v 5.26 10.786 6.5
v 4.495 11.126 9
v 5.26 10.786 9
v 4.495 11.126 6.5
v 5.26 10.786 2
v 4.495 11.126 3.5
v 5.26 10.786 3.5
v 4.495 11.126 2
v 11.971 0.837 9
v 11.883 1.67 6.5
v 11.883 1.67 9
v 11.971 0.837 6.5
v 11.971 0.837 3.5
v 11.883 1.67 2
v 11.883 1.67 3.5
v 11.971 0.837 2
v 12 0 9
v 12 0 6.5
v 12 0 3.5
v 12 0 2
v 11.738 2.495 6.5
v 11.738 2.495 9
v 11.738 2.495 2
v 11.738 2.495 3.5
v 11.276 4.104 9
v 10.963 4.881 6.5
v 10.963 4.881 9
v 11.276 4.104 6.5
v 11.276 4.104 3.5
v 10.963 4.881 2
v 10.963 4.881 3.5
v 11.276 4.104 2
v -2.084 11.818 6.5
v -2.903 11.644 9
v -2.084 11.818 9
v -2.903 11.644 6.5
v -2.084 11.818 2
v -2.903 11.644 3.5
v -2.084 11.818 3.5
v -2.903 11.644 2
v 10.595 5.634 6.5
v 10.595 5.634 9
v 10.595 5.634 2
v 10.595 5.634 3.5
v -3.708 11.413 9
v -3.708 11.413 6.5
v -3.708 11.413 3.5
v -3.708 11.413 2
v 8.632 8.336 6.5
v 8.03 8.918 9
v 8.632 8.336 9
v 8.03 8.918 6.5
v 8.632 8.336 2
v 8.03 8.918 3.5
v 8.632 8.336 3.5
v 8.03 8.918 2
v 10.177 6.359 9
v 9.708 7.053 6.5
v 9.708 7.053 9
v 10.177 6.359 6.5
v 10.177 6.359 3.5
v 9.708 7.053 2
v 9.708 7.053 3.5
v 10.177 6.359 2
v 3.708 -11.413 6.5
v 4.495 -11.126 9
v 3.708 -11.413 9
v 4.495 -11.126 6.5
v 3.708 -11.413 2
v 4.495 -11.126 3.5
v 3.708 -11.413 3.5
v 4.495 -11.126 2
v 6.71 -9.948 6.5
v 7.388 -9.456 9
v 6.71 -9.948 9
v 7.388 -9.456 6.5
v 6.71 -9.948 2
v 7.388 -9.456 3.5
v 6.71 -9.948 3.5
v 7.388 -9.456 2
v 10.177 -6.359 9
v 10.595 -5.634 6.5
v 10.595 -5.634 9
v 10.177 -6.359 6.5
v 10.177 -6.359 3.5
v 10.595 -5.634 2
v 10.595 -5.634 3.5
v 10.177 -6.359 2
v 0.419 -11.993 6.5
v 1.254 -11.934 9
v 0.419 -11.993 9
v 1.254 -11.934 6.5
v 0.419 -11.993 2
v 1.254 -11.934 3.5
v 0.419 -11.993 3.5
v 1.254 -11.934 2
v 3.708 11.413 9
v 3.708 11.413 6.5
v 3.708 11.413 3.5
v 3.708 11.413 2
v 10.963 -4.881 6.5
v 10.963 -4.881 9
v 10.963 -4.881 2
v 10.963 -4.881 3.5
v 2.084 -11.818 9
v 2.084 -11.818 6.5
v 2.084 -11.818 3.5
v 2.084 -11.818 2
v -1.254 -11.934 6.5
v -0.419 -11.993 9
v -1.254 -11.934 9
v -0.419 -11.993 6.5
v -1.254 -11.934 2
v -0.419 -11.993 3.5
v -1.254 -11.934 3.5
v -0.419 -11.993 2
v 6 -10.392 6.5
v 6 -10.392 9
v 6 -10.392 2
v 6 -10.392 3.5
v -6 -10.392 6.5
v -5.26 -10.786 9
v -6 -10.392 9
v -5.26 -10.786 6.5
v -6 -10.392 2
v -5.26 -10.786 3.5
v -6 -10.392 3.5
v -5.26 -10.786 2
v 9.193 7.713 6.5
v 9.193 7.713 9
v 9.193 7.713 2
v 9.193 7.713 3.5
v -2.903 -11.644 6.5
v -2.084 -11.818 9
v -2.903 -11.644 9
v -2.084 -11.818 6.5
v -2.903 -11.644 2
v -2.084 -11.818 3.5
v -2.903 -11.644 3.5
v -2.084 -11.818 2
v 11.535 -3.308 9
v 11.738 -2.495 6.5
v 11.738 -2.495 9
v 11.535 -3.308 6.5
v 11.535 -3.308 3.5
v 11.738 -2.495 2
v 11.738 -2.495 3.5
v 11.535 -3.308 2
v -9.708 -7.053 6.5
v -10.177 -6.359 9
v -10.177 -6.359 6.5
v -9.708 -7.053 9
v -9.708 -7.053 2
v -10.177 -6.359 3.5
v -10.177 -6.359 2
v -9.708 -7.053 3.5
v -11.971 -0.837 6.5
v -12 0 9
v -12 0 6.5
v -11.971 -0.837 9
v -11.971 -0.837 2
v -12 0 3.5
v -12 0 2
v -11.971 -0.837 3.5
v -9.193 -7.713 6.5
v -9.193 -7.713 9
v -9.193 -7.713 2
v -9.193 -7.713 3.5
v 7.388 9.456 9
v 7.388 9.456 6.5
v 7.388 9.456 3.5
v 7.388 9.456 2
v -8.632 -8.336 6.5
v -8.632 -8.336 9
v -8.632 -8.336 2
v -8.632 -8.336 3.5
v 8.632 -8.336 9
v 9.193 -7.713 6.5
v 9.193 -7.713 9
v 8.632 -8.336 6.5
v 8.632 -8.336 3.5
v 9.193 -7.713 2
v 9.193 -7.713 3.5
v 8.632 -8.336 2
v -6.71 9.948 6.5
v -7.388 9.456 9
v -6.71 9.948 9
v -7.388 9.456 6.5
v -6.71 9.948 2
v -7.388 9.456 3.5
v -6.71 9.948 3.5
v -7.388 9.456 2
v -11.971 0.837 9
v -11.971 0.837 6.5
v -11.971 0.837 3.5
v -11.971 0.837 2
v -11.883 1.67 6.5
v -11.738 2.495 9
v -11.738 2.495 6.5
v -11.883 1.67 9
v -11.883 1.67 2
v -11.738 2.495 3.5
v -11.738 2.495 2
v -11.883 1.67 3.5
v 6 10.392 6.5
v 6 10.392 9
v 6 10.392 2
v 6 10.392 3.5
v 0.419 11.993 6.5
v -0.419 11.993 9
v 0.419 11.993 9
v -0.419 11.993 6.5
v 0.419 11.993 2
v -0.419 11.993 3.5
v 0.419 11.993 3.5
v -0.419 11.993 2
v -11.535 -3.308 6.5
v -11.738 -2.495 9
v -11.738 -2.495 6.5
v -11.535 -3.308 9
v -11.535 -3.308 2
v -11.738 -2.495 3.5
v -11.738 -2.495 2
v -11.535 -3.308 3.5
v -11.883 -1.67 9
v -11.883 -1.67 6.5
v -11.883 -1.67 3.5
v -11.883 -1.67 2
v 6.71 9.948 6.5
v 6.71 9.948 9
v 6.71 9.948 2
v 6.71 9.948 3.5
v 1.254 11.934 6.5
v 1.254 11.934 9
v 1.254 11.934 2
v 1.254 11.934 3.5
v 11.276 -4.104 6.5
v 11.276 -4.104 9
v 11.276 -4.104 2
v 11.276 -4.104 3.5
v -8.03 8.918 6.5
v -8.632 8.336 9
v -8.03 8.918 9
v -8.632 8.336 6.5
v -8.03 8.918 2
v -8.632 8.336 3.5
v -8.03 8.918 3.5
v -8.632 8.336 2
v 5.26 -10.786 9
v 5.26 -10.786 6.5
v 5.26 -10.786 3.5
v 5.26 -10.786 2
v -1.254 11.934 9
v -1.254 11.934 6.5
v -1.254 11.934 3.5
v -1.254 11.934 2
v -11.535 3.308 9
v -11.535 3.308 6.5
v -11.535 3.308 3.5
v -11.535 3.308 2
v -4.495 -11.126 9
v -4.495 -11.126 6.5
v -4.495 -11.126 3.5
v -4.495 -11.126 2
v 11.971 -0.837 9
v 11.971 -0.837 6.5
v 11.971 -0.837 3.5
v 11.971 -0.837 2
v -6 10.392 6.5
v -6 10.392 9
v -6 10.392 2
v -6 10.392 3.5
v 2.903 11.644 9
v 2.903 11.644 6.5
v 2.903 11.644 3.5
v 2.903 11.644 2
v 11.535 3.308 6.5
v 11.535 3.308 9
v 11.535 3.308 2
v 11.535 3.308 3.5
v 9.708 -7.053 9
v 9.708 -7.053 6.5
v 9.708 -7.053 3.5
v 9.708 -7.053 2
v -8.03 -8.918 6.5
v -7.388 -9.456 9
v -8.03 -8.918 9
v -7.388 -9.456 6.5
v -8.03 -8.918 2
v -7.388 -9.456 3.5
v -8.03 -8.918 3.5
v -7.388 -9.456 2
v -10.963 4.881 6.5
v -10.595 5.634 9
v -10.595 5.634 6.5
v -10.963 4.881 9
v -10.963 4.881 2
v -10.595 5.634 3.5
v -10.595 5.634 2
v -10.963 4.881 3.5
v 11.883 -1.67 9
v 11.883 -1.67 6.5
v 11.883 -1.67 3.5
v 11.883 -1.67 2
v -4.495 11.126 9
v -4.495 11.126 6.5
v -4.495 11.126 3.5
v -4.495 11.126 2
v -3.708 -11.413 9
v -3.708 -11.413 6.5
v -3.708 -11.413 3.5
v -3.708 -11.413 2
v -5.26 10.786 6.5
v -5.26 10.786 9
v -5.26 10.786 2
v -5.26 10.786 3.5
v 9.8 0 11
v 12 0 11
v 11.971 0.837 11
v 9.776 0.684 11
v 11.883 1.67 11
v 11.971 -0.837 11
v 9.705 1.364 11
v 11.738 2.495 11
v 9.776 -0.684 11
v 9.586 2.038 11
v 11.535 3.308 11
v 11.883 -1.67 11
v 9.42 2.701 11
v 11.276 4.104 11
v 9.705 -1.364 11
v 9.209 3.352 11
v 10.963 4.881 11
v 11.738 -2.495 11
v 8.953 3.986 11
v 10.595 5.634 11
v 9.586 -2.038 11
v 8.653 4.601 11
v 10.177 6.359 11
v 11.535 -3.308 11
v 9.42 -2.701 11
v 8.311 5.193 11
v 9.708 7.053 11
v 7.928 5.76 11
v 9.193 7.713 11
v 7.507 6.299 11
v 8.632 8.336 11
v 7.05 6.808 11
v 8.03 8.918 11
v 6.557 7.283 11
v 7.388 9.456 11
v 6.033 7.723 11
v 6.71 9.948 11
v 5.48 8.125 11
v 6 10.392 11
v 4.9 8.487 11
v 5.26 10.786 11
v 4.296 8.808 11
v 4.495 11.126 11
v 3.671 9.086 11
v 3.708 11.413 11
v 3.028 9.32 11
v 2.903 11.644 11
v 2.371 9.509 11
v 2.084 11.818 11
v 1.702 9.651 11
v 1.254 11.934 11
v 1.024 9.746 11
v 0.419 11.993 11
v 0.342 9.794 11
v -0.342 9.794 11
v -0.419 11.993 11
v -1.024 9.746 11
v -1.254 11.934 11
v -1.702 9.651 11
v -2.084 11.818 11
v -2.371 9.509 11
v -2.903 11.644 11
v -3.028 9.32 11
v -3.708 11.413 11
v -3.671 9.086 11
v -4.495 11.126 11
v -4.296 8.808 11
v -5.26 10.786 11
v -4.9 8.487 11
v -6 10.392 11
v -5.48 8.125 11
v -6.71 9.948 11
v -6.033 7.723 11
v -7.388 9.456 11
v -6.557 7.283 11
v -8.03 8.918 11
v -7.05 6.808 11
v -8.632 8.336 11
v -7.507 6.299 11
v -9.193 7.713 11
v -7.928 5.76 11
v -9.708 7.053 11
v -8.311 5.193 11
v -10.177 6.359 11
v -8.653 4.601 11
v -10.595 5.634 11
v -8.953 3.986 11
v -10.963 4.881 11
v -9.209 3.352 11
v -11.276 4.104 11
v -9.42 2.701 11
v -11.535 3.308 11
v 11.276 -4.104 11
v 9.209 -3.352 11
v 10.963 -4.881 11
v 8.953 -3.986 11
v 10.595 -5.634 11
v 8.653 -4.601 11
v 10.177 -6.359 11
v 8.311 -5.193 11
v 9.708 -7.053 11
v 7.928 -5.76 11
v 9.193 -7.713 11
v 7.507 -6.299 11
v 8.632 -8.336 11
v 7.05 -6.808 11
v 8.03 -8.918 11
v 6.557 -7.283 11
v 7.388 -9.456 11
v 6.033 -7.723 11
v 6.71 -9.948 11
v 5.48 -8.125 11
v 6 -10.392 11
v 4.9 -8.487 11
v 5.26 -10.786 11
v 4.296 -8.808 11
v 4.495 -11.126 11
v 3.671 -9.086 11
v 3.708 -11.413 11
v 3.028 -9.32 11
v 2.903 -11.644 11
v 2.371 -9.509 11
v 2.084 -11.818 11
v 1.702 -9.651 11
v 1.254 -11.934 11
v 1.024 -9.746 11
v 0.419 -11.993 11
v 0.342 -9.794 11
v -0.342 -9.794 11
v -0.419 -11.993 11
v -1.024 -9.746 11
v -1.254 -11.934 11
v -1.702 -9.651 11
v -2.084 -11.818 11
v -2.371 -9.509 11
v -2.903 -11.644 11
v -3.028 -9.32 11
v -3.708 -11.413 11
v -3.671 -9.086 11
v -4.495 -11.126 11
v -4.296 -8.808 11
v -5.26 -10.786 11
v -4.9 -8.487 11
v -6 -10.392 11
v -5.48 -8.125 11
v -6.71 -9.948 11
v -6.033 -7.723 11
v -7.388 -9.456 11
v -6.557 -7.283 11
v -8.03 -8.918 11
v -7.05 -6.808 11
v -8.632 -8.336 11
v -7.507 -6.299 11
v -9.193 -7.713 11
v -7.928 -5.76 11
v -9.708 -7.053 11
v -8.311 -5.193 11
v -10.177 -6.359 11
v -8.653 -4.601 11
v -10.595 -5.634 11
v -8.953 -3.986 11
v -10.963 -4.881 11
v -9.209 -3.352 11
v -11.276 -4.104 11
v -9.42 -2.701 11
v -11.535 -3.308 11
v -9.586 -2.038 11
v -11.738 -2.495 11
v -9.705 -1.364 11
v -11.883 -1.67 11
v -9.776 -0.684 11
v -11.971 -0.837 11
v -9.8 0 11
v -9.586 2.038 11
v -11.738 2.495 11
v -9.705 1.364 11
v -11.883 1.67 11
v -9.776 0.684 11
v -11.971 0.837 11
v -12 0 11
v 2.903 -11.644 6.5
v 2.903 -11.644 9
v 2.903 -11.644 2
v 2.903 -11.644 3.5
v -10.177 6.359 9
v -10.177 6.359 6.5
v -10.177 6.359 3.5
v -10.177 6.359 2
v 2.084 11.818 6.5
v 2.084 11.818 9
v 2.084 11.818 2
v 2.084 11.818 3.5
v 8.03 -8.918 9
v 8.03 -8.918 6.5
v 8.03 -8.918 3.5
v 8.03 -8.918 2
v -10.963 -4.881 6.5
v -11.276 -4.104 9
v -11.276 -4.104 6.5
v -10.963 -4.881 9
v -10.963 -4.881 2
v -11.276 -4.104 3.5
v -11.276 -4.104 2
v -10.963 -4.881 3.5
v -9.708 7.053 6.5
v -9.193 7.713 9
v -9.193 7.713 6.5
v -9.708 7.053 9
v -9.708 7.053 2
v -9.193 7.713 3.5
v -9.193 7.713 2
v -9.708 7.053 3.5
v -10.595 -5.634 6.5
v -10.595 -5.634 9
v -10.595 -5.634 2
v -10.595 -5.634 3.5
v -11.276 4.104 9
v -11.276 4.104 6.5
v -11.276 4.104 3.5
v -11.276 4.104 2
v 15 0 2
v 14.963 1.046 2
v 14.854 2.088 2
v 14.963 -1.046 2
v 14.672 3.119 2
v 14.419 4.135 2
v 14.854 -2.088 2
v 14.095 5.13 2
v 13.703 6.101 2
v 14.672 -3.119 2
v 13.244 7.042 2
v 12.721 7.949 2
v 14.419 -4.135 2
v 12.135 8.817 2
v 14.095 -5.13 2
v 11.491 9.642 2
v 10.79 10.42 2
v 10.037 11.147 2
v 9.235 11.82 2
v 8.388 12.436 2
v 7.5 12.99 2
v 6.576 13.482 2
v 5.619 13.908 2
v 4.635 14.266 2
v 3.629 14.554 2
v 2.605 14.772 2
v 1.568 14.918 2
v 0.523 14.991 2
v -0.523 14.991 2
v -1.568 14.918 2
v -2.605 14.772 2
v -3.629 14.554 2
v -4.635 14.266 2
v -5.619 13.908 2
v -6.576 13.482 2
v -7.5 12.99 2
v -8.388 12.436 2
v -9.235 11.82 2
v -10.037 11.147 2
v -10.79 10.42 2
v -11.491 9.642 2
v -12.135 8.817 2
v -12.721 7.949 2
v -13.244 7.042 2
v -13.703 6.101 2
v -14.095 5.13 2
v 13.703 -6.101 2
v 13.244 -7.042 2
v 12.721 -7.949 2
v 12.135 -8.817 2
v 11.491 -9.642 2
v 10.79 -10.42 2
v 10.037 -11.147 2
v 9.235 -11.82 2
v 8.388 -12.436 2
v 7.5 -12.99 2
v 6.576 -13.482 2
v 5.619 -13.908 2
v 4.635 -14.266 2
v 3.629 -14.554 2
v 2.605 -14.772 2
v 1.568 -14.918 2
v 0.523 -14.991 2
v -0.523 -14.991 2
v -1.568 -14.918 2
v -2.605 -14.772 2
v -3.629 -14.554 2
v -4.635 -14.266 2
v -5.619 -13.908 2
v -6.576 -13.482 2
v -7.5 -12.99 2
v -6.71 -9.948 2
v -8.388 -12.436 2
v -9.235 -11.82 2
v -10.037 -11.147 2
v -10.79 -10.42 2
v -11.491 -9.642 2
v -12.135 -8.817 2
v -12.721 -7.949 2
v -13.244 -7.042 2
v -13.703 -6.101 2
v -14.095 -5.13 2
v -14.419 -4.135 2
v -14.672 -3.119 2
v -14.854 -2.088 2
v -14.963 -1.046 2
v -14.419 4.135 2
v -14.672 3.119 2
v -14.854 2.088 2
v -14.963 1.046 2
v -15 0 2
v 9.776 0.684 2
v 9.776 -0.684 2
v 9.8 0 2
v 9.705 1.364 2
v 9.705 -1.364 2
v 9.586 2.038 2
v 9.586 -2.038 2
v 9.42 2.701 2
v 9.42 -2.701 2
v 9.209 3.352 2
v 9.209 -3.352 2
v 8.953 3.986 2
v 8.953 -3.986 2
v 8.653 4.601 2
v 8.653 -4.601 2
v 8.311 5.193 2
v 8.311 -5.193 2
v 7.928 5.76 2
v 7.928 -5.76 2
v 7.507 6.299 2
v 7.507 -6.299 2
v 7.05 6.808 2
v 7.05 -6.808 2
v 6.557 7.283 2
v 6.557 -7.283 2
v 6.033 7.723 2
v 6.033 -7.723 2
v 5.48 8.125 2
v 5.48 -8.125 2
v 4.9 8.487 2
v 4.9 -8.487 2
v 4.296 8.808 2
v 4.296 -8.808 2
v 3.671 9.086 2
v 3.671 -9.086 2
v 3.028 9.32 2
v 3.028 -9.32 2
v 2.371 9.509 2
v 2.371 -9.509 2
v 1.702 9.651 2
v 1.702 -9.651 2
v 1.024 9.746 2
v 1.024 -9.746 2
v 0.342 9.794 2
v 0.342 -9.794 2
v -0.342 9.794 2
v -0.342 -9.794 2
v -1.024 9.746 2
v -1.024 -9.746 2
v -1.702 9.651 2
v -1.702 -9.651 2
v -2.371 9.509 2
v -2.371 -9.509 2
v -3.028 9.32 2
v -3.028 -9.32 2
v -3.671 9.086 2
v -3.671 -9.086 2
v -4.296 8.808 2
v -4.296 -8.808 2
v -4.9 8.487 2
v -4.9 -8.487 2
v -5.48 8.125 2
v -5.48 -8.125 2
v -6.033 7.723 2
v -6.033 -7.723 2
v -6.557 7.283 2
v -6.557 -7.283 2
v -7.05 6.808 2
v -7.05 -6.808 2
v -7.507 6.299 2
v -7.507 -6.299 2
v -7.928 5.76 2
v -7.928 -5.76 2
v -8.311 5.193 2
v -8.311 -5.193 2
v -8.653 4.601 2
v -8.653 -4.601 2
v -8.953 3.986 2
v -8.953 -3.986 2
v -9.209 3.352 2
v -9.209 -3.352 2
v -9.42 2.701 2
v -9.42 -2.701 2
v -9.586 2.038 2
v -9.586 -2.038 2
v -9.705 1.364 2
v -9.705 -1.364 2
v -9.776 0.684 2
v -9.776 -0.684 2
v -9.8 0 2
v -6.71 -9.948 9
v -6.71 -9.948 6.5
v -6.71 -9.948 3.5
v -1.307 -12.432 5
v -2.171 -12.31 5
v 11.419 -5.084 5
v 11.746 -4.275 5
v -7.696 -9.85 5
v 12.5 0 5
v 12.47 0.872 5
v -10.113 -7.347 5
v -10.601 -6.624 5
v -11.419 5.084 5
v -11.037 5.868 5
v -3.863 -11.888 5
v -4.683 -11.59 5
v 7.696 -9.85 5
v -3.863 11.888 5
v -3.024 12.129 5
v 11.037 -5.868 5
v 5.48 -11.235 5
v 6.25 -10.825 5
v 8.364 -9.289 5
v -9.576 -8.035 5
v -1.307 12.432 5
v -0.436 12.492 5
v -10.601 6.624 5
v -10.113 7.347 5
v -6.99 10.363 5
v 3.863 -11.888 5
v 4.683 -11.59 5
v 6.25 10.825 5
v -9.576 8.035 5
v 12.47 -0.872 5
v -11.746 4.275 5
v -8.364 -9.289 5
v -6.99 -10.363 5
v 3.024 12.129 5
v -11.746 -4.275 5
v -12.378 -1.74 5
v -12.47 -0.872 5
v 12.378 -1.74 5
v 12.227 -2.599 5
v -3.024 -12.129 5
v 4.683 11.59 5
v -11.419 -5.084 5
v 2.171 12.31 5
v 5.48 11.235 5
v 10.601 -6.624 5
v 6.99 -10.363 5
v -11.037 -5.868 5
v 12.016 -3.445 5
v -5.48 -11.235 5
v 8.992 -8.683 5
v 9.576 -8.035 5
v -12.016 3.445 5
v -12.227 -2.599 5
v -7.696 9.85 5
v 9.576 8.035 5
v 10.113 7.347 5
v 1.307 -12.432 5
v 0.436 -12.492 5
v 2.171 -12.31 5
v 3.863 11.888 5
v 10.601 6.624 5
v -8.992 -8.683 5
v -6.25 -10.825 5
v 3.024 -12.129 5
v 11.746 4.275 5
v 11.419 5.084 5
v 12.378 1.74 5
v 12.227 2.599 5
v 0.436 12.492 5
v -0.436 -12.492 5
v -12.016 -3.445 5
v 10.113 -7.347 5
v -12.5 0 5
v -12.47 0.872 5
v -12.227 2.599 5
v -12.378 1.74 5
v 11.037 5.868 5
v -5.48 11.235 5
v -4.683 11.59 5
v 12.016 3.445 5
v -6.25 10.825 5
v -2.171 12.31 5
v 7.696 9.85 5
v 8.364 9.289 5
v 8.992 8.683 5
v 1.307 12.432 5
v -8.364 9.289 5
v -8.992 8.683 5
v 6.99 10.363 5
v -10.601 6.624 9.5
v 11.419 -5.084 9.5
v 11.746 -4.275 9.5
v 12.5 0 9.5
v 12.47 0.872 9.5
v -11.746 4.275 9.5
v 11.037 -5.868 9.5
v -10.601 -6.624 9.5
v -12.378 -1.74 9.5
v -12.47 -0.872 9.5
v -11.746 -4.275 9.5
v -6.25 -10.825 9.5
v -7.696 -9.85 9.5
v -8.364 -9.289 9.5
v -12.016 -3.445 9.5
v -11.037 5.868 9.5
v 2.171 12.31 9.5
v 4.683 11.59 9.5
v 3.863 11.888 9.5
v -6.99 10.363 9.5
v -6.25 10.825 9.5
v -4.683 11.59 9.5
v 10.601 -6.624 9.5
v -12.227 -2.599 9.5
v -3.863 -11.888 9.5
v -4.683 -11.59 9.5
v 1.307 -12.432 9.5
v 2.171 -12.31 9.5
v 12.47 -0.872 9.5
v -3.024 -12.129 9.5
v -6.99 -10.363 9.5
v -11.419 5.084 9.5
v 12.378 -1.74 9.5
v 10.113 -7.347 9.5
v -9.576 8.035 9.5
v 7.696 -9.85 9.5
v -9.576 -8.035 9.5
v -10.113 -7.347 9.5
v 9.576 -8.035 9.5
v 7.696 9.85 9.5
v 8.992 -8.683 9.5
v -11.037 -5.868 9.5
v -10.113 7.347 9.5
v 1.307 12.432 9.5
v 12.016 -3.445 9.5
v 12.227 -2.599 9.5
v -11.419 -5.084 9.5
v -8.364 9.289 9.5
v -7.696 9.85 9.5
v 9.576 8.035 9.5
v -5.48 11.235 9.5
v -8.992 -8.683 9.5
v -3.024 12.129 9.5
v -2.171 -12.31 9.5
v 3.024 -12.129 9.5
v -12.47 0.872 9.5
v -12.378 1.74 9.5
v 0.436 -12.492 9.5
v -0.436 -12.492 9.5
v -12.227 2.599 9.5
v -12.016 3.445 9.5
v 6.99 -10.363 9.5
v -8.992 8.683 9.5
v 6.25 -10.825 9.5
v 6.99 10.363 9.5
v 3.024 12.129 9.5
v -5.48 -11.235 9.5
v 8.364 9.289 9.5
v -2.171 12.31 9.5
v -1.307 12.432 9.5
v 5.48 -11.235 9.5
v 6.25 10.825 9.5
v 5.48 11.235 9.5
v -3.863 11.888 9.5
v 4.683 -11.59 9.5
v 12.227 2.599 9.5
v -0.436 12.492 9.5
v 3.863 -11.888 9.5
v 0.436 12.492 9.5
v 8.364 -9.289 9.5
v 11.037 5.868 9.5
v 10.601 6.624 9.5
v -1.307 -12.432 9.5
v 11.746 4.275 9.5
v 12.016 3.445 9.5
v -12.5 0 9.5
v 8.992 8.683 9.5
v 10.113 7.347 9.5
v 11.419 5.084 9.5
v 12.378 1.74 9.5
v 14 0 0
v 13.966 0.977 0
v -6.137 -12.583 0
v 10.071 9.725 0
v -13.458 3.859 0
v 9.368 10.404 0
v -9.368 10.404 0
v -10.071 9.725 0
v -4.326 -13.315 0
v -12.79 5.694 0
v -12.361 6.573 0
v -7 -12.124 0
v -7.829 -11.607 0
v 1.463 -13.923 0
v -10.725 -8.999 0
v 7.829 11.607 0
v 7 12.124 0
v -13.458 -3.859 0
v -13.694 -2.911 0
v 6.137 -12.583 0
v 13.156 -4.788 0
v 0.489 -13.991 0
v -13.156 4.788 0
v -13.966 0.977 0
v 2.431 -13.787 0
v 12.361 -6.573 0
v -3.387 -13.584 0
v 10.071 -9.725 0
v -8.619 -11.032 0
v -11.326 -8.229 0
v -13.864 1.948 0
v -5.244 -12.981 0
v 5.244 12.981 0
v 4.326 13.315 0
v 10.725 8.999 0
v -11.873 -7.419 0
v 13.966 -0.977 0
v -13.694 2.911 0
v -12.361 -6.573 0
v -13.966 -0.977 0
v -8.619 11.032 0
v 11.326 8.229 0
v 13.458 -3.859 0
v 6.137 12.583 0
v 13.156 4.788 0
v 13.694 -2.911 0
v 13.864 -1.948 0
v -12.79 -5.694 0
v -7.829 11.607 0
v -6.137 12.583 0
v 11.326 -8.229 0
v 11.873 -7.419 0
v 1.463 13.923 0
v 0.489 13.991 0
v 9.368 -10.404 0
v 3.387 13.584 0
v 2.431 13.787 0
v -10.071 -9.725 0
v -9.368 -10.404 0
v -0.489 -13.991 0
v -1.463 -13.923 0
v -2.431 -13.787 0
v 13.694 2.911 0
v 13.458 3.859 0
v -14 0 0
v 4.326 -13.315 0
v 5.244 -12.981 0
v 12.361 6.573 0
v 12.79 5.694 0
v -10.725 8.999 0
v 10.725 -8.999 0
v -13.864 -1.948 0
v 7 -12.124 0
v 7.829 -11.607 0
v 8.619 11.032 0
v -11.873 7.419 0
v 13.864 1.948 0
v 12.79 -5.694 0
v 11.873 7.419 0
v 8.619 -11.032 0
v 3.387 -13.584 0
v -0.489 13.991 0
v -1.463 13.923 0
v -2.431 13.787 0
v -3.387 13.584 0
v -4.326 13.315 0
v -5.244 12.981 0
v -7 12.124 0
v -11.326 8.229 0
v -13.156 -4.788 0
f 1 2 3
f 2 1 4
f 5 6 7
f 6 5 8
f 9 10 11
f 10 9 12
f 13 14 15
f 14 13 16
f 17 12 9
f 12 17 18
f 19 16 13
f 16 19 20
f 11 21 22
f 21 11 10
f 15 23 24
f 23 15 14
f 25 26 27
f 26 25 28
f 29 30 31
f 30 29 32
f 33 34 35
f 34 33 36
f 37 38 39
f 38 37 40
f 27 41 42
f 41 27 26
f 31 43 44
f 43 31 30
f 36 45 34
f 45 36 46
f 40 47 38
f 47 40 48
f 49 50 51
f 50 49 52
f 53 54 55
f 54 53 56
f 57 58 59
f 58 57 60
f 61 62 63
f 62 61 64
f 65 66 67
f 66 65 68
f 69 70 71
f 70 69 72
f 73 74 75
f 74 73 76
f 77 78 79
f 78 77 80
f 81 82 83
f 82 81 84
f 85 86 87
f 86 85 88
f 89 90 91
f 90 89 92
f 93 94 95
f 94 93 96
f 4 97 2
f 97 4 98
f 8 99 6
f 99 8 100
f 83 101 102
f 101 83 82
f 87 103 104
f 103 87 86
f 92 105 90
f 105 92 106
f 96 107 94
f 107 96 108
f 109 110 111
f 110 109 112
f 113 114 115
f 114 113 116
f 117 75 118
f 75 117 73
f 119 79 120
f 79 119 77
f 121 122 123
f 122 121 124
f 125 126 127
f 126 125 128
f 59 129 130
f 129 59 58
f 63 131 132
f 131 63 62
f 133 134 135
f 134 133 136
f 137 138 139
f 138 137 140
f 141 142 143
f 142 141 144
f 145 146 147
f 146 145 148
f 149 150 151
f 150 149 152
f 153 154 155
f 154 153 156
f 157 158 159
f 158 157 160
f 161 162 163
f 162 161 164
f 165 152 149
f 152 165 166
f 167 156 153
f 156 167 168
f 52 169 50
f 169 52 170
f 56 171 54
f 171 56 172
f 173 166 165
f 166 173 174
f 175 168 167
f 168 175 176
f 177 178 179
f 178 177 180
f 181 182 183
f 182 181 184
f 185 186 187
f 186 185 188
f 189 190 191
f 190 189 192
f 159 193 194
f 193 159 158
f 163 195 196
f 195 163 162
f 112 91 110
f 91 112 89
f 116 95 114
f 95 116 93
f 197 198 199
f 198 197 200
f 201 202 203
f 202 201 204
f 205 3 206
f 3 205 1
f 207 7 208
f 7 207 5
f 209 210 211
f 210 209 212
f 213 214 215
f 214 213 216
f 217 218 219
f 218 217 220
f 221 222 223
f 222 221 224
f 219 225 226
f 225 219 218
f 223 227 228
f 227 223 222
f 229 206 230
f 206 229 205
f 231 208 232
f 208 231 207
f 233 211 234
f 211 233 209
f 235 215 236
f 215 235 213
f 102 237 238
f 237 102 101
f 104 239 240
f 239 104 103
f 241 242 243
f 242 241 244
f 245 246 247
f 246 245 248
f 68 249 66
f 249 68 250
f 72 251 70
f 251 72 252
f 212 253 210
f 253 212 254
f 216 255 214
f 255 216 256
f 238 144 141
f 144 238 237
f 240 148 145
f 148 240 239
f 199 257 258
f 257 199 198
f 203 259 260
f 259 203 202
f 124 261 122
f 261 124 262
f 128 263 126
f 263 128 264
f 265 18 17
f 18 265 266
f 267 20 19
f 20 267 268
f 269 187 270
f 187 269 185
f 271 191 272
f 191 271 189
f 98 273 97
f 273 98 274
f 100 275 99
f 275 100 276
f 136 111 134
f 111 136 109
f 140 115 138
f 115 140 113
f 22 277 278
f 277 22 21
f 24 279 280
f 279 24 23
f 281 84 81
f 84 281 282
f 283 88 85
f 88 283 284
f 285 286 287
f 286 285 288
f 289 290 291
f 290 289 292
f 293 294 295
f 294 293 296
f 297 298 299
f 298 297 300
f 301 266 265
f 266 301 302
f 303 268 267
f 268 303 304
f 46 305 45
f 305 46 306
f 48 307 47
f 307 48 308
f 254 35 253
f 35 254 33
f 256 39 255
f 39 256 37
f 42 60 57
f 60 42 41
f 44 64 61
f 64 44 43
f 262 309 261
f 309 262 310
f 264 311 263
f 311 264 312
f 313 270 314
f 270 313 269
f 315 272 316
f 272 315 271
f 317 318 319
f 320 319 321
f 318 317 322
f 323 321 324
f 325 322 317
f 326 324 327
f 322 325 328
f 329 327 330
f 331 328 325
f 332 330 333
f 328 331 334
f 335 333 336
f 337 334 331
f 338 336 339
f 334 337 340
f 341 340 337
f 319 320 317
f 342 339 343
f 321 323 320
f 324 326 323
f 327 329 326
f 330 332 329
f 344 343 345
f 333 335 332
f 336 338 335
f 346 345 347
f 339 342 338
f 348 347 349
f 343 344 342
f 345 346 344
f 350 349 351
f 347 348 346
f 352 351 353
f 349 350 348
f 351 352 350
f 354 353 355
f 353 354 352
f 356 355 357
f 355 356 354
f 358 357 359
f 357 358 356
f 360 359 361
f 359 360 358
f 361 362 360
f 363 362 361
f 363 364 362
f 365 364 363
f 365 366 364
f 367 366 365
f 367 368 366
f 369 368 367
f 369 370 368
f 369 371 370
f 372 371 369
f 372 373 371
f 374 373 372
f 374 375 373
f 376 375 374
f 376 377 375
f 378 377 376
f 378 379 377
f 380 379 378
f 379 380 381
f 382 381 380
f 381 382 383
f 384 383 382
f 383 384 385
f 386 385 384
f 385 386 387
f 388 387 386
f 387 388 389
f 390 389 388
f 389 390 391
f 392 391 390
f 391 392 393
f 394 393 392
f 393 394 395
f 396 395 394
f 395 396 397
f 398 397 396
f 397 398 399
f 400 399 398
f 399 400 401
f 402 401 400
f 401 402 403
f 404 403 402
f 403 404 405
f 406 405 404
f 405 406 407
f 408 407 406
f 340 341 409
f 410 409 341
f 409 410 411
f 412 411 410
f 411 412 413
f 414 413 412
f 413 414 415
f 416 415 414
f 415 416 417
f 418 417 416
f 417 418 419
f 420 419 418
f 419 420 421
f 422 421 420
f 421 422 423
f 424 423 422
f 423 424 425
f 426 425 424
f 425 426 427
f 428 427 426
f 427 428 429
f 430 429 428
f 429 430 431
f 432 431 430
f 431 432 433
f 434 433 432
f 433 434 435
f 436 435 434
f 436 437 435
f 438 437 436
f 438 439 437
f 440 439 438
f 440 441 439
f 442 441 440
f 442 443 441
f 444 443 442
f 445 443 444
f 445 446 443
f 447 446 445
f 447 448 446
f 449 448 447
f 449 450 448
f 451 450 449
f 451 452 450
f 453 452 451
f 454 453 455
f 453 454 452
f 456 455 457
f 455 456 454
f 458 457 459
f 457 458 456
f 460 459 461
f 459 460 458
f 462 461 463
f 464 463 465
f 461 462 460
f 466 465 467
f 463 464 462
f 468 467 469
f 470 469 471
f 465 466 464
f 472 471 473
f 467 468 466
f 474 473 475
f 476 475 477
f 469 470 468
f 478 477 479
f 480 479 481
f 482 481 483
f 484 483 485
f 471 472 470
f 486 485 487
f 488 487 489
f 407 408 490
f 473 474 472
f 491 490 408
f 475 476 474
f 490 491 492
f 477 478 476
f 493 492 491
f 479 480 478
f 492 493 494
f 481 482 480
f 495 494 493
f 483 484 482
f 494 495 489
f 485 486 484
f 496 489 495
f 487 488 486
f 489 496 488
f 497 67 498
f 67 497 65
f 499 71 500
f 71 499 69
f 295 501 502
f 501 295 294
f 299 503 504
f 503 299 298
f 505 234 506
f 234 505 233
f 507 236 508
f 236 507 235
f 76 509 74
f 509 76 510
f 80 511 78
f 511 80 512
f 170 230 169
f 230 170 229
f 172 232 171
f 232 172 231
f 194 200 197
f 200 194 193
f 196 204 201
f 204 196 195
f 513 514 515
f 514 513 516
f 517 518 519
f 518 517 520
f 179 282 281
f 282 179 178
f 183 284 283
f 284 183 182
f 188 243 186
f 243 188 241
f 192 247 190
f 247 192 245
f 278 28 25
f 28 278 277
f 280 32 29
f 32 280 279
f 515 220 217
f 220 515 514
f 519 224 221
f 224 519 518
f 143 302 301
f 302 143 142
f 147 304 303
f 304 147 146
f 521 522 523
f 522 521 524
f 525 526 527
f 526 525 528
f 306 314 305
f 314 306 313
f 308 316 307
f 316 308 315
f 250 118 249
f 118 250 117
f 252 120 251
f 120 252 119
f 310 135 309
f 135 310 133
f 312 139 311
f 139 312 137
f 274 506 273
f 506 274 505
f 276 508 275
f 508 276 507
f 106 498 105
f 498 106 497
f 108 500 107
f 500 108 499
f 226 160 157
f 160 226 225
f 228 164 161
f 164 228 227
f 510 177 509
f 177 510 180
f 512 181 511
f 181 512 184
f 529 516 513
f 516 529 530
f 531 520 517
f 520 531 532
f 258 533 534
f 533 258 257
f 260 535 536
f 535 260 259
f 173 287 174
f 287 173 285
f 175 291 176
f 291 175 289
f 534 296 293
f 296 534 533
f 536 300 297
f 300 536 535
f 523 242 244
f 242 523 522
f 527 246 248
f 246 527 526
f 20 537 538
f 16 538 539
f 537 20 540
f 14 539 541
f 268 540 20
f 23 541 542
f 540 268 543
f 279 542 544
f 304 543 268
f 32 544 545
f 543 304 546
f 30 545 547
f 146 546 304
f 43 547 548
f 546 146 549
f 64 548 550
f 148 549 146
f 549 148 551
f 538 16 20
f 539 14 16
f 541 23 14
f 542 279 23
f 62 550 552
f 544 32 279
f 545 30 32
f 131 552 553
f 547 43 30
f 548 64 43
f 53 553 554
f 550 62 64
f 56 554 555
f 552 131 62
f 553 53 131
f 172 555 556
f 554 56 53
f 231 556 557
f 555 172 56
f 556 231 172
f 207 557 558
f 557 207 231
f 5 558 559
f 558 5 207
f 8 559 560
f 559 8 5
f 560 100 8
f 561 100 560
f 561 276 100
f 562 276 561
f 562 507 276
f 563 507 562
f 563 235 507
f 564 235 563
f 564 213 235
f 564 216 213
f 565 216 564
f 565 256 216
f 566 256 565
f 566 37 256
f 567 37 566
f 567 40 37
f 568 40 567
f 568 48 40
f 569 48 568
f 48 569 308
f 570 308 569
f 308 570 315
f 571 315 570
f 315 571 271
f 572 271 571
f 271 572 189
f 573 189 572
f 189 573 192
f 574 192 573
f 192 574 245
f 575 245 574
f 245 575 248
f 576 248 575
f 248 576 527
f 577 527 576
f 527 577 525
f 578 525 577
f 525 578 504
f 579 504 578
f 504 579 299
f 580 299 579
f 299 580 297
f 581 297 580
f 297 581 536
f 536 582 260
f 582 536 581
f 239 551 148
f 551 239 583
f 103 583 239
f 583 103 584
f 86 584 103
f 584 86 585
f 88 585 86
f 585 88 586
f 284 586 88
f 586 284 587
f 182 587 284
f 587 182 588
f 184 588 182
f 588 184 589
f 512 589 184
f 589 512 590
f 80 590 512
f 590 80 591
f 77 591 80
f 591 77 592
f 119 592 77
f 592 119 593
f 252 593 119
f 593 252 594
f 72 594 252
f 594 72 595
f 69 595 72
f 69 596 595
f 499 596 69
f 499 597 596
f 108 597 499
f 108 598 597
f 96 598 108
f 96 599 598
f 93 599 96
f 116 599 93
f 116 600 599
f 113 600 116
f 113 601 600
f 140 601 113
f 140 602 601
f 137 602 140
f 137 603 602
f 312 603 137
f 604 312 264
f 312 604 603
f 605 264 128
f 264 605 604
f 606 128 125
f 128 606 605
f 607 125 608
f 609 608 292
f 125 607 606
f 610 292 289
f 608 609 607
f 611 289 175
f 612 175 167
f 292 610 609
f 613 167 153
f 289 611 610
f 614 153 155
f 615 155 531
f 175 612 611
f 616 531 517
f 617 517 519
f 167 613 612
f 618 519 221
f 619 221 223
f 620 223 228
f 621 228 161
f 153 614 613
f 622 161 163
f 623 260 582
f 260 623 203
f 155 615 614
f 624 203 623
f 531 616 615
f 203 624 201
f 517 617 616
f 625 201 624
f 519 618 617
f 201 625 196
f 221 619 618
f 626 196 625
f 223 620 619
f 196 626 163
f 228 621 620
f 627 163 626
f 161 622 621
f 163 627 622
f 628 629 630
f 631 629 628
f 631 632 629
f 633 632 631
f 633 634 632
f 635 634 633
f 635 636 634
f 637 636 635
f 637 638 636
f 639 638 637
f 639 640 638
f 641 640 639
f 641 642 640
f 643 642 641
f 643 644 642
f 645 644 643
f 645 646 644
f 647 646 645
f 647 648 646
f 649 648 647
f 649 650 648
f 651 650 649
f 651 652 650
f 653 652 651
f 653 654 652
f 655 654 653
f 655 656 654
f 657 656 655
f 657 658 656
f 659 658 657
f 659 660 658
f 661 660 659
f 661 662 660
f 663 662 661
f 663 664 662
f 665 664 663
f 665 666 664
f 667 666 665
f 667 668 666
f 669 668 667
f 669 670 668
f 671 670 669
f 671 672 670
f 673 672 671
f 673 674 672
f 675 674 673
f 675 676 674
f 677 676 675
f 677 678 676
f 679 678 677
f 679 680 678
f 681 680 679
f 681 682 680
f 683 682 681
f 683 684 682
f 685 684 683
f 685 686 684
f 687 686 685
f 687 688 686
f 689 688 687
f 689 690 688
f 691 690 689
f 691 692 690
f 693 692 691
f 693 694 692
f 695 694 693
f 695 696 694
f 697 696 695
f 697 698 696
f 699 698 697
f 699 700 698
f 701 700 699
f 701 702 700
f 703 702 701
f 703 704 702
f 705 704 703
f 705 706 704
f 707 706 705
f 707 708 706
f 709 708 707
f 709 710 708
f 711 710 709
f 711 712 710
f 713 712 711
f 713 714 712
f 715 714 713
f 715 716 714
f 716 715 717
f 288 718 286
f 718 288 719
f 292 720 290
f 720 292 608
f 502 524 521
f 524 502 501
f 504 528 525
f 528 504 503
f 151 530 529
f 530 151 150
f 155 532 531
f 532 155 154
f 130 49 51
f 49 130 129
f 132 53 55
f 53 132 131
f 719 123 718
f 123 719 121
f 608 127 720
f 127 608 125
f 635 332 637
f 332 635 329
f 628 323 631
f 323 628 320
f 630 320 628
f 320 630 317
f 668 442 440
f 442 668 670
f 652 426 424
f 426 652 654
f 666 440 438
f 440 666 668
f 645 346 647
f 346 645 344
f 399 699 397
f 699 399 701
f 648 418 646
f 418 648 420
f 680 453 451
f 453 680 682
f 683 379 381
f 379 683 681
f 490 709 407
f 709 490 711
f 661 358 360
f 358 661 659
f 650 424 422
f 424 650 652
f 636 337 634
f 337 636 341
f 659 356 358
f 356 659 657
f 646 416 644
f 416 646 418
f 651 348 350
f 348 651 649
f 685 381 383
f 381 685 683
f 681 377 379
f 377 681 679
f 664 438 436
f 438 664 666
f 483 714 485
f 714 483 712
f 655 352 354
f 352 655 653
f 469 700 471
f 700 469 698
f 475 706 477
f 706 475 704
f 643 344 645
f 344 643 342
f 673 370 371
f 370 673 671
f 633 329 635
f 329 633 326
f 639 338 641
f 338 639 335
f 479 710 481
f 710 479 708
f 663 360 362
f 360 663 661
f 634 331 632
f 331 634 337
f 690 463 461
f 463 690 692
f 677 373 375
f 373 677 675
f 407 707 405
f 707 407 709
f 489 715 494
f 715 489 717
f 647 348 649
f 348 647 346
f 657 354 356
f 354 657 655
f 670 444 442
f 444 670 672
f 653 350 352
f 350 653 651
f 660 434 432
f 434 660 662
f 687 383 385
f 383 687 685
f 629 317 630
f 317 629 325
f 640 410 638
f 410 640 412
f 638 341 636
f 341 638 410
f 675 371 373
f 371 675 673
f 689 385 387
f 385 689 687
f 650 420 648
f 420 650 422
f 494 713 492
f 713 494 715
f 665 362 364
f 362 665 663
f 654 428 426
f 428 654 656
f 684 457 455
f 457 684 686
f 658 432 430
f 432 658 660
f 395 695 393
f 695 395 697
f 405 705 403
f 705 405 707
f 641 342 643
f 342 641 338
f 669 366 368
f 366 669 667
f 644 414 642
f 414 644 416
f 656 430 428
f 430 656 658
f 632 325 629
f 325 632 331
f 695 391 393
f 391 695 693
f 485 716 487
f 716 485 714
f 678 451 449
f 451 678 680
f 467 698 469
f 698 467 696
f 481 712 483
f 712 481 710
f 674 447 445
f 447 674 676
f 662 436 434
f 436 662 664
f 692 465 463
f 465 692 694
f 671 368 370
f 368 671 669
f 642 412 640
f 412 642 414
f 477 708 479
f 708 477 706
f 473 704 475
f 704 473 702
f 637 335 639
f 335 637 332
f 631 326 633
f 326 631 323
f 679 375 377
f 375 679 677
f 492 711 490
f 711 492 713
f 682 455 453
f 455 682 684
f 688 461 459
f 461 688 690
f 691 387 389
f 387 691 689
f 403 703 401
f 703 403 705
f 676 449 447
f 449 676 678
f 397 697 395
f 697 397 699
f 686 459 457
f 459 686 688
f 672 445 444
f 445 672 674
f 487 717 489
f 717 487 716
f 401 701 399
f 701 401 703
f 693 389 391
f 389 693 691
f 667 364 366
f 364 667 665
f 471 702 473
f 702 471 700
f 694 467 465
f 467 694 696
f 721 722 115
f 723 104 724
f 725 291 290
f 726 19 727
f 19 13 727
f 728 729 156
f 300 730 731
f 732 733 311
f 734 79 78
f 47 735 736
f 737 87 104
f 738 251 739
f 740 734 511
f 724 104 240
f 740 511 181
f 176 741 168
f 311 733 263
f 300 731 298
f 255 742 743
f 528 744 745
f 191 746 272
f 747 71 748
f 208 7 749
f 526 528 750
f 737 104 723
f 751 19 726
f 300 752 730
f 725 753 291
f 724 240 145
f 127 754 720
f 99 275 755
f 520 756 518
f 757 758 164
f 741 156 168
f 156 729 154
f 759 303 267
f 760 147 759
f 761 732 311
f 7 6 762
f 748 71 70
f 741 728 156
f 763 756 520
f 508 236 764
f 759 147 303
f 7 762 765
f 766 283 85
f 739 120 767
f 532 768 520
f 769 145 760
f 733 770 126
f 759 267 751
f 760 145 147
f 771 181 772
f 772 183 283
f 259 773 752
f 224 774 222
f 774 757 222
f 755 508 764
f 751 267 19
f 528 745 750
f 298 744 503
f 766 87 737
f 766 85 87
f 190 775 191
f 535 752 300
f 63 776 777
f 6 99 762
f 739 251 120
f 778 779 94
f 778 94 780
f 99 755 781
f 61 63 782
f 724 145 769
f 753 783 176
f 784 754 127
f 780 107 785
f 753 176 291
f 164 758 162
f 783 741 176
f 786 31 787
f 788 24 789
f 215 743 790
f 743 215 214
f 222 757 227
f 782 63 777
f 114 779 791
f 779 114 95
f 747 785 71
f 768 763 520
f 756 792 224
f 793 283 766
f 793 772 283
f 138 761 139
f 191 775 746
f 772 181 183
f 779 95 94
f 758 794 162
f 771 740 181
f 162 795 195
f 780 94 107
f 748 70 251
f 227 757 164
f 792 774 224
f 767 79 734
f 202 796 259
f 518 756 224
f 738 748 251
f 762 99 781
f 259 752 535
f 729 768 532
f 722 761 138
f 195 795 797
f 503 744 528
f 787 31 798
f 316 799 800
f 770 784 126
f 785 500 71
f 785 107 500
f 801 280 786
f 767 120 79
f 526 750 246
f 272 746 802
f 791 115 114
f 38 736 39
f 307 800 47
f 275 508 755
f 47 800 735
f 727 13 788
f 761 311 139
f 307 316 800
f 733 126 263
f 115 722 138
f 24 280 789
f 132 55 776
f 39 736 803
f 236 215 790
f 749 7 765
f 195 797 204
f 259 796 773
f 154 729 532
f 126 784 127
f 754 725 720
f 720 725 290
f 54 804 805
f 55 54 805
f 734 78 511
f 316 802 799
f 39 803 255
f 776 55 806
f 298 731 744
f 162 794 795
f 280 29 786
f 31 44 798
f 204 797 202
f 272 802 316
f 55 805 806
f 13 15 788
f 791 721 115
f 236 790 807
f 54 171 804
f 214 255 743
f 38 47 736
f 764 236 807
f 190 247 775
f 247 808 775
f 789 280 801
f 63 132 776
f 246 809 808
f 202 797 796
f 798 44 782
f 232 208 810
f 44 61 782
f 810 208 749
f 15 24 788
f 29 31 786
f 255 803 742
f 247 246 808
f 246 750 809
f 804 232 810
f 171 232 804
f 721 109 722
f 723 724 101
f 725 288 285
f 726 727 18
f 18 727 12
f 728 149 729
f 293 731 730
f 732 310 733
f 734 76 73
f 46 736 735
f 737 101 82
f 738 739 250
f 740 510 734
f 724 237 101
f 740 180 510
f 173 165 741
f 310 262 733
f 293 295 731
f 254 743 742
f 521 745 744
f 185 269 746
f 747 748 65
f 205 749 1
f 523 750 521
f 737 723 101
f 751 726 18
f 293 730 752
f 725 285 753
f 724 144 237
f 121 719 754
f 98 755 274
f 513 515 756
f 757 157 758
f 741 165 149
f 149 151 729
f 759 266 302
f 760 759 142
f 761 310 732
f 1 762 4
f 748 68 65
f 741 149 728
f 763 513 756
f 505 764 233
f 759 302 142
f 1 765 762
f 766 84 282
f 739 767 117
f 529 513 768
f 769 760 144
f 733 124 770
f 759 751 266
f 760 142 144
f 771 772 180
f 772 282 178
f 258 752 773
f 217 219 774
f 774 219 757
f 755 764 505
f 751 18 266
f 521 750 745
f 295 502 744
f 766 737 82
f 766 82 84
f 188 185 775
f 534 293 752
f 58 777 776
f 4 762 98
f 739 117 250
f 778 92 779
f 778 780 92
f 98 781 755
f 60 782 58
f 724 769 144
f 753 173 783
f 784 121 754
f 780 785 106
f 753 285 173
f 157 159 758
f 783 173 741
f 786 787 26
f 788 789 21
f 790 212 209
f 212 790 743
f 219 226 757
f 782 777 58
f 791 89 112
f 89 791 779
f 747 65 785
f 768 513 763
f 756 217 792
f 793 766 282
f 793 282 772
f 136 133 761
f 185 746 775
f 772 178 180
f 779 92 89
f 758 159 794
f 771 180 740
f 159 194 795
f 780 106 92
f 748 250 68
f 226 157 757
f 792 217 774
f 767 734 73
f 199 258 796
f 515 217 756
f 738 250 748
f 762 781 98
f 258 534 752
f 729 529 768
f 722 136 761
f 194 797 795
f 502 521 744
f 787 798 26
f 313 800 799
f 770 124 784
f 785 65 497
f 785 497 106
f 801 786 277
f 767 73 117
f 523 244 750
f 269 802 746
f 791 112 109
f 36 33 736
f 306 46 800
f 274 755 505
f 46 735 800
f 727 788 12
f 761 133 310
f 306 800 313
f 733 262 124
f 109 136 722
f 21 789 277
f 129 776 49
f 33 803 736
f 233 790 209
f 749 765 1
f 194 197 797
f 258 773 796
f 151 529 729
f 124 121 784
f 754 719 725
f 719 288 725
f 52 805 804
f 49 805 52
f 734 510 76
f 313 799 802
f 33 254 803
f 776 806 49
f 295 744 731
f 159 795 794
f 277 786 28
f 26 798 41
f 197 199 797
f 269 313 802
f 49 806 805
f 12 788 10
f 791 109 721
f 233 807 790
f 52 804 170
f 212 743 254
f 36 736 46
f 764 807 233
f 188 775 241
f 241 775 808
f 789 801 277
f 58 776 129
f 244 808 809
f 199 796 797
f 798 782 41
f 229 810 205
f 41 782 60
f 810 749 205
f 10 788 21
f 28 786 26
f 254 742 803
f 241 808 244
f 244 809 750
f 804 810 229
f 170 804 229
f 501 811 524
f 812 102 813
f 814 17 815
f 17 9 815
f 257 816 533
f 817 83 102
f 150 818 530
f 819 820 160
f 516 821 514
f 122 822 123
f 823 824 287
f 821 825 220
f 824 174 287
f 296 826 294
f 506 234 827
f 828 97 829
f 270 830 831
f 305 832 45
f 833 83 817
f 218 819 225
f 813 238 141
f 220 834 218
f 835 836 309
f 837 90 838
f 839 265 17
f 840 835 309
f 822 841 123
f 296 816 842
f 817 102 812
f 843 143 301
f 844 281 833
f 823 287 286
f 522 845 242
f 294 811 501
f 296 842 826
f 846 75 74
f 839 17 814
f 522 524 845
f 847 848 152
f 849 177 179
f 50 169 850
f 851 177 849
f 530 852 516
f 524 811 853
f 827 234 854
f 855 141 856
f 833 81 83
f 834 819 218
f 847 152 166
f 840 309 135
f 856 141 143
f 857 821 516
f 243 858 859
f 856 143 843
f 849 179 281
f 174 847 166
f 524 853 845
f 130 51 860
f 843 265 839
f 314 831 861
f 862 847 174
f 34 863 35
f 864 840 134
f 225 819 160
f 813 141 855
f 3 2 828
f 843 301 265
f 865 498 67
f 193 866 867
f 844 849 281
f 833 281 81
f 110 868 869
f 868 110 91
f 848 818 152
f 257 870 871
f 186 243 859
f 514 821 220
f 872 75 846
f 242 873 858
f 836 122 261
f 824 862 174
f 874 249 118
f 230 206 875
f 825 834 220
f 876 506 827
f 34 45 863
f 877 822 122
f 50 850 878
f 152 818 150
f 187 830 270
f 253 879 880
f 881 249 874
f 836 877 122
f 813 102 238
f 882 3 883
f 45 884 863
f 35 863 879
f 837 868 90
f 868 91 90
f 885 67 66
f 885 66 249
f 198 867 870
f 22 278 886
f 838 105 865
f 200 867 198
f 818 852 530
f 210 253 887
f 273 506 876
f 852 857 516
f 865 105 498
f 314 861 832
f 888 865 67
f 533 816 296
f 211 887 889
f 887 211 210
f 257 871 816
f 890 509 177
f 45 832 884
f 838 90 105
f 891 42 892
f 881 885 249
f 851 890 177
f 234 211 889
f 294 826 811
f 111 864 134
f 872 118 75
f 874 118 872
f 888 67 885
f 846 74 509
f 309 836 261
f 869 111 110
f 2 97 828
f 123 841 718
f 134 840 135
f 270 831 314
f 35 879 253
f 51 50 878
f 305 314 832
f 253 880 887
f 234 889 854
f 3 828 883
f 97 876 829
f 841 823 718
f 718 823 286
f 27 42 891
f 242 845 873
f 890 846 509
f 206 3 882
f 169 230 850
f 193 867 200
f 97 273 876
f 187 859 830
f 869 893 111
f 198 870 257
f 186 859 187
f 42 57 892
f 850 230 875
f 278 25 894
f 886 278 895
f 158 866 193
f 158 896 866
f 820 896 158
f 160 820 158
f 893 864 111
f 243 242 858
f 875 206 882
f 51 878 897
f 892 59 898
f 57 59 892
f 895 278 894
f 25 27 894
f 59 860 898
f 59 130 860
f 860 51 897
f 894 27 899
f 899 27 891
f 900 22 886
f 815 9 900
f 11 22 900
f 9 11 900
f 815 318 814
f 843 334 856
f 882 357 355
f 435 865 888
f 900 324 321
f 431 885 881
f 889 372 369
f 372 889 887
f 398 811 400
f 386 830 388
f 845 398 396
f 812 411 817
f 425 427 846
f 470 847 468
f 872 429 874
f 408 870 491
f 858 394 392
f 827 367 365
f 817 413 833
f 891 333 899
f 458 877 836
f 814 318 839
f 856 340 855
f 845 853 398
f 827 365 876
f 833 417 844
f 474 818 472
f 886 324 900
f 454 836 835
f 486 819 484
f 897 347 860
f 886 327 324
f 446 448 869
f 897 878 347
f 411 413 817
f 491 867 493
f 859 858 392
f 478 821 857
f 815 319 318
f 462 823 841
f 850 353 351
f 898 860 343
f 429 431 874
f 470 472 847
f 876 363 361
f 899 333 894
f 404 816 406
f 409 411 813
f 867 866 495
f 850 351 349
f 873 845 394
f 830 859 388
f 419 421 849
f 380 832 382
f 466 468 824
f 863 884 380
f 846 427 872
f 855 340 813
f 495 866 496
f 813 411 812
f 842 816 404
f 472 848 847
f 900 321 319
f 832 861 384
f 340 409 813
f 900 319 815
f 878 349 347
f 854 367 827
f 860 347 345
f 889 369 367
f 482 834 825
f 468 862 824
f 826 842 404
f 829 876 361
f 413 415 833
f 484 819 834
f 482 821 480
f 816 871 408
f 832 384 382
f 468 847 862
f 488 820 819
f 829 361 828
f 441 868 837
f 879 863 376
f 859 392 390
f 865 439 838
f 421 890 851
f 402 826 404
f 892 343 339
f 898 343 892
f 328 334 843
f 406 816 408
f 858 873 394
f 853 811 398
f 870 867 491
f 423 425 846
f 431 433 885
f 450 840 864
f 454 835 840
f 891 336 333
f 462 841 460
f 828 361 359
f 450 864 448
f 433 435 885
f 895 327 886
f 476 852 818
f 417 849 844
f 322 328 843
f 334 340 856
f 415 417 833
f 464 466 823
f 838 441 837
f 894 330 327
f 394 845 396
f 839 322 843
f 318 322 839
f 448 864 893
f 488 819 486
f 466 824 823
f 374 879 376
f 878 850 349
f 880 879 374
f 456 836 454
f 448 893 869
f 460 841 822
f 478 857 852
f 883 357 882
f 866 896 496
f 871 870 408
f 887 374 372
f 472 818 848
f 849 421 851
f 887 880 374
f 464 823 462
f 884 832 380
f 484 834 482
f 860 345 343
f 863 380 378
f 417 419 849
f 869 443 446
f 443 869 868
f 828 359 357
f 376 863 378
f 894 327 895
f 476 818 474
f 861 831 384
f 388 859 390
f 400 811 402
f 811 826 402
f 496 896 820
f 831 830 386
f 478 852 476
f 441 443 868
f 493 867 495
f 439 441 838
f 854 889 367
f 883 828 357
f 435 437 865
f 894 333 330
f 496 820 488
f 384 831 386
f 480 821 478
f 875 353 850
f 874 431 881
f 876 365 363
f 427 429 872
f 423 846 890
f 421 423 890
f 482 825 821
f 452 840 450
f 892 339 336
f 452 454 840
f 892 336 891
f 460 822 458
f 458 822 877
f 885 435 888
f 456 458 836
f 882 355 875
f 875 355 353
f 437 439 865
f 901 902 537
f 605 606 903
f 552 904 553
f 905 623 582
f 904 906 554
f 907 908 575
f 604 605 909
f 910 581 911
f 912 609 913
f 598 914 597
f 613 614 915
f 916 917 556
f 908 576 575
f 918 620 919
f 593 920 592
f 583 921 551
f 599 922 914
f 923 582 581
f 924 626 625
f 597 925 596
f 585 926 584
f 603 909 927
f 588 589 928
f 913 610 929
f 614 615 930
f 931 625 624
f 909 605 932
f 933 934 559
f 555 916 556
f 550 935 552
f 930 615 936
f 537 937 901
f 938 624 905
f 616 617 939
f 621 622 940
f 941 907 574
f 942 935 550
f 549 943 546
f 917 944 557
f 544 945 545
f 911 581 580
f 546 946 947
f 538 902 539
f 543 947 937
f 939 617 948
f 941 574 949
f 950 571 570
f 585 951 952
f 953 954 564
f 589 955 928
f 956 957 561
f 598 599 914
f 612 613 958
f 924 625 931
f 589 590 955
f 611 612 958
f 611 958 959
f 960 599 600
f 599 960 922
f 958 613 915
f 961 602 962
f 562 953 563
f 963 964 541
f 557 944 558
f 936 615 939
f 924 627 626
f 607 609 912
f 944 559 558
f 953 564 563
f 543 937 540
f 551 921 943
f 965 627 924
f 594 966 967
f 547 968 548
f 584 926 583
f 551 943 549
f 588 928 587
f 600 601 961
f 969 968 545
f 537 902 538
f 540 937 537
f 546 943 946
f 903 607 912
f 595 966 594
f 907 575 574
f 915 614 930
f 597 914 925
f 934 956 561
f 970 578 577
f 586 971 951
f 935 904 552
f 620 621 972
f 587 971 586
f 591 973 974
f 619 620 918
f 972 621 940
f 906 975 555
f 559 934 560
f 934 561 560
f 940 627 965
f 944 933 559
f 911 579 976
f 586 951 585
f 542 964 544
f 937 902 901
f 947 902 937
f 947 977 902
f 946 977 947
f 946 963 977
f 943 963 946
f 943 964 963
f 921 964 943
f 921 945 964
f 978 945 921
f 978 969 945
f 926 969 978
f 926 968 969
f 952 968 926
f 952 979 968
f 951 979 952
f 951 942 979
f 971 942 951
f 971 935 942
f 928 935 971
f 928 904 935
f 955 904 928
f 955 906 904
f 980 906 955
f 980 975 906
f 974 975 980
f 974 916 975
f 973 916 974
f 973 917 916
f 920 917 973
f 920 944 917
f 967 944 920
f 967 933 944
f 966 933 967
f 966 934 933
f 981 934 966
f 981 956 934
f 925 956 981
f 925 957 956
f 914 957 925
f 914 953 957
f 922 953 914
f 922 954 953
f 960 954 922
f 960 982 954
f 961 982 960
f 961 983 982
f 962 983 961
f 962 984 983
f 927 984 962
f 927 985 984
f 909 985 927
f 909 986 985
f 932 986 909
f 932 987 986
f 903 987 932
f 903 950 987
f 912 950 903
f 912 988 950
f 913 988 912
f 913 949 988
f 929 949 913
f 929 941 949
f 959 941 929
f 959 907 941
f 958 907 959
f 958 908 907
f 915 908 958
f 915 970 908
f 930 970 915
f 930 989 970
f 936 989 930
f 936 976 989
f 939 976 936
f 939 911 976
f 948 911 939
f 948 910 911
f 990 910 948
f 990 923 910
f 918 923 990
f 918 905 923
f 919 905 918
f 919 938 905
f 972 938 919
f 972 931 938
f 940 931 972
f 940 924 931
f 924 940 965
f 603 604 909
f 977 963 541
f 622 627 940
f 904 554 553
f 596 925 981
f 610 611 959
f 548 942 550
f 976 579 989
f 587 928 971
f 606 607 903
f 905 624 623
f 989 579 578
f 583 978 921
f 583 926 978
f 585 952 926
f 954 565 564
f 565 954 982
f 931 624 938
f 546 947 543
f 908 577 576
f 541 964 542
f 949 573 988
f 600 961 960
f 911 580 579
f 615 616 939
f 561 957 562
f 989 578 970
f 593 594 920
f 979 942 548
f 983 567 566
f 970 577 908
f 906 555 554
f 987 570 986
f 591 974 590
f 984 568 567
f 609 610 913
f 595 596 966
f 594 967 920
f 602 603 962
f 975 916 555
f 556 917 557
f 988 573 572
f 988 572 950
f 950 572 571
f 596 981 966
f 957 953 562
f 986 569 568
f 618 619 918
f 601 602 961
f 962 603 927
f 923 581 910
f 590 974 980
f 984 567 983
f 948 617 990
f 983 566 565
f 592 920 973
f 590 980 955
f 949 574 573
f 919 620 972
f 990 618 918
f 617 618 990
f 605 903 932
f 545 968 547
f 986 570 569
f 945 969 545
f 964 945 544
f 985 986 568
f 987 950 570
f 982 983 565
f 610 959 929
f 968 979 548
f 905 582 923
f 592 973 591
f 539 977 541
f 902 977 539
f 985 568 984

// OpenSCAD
// Screw dust/water proof cover for scooter
//
// This work is licensed under a Creative Commons
// Attribution-NonCommercial-ShareAlike 4.0 International (CC BY-NC-SA 4.0)
// Visit: http://creativecommons.org/licenses/by-nc-sa/4.0/
//
// Clarence Lee
// clarence@nehs.tw

// Note: Test on PTE material


$fn = 360/4;

Cap_radius = 12.0;
Cap_radius_lips = 0.5;

Cap_Cover_radius = 15.0;
Cap_height = 11.0;

Cap_radius_wider = Cap_radius + Cap_radius_lips;

module lips(z_off, r_a, r_b, height_l)
{
	difference()
	{		
		translate([0,0,z_off]){
			# cylinder(r1=r_a, r2=r_b,h=height_l);}
		translate([0,0,z_off]) {
			# cylinder(r=min(r_a,r_b) ,h=height_l); }

	}
}

union()
{
	cylinder(r1=Cap_Cover_radius-1,r2=Cap_Cover_radius, h=2);

	difference()
	{
		
		translate([0,0,2])
			cylinder(r=Cap_radius,h=Cap_height-2);
		translate([0,0,2])
			cylinder(r=Cap_radius-2.2,h=Cap_height-2);	
	}


	lips(3.5, Cap_radius, Cap_radius_wider, 1.5);
	translate([0,0,10]) mirror([0,0,1]) lips(3.5, Cap_radius, Cap_radius_wider, 1.5);
	lips(Cap_height-2, Cap_radius, Cap_radius_wider, 0.5);
	lips(Cap_height-1.5, Cap_radius_wider, Cap_radius, 1.5);

}
